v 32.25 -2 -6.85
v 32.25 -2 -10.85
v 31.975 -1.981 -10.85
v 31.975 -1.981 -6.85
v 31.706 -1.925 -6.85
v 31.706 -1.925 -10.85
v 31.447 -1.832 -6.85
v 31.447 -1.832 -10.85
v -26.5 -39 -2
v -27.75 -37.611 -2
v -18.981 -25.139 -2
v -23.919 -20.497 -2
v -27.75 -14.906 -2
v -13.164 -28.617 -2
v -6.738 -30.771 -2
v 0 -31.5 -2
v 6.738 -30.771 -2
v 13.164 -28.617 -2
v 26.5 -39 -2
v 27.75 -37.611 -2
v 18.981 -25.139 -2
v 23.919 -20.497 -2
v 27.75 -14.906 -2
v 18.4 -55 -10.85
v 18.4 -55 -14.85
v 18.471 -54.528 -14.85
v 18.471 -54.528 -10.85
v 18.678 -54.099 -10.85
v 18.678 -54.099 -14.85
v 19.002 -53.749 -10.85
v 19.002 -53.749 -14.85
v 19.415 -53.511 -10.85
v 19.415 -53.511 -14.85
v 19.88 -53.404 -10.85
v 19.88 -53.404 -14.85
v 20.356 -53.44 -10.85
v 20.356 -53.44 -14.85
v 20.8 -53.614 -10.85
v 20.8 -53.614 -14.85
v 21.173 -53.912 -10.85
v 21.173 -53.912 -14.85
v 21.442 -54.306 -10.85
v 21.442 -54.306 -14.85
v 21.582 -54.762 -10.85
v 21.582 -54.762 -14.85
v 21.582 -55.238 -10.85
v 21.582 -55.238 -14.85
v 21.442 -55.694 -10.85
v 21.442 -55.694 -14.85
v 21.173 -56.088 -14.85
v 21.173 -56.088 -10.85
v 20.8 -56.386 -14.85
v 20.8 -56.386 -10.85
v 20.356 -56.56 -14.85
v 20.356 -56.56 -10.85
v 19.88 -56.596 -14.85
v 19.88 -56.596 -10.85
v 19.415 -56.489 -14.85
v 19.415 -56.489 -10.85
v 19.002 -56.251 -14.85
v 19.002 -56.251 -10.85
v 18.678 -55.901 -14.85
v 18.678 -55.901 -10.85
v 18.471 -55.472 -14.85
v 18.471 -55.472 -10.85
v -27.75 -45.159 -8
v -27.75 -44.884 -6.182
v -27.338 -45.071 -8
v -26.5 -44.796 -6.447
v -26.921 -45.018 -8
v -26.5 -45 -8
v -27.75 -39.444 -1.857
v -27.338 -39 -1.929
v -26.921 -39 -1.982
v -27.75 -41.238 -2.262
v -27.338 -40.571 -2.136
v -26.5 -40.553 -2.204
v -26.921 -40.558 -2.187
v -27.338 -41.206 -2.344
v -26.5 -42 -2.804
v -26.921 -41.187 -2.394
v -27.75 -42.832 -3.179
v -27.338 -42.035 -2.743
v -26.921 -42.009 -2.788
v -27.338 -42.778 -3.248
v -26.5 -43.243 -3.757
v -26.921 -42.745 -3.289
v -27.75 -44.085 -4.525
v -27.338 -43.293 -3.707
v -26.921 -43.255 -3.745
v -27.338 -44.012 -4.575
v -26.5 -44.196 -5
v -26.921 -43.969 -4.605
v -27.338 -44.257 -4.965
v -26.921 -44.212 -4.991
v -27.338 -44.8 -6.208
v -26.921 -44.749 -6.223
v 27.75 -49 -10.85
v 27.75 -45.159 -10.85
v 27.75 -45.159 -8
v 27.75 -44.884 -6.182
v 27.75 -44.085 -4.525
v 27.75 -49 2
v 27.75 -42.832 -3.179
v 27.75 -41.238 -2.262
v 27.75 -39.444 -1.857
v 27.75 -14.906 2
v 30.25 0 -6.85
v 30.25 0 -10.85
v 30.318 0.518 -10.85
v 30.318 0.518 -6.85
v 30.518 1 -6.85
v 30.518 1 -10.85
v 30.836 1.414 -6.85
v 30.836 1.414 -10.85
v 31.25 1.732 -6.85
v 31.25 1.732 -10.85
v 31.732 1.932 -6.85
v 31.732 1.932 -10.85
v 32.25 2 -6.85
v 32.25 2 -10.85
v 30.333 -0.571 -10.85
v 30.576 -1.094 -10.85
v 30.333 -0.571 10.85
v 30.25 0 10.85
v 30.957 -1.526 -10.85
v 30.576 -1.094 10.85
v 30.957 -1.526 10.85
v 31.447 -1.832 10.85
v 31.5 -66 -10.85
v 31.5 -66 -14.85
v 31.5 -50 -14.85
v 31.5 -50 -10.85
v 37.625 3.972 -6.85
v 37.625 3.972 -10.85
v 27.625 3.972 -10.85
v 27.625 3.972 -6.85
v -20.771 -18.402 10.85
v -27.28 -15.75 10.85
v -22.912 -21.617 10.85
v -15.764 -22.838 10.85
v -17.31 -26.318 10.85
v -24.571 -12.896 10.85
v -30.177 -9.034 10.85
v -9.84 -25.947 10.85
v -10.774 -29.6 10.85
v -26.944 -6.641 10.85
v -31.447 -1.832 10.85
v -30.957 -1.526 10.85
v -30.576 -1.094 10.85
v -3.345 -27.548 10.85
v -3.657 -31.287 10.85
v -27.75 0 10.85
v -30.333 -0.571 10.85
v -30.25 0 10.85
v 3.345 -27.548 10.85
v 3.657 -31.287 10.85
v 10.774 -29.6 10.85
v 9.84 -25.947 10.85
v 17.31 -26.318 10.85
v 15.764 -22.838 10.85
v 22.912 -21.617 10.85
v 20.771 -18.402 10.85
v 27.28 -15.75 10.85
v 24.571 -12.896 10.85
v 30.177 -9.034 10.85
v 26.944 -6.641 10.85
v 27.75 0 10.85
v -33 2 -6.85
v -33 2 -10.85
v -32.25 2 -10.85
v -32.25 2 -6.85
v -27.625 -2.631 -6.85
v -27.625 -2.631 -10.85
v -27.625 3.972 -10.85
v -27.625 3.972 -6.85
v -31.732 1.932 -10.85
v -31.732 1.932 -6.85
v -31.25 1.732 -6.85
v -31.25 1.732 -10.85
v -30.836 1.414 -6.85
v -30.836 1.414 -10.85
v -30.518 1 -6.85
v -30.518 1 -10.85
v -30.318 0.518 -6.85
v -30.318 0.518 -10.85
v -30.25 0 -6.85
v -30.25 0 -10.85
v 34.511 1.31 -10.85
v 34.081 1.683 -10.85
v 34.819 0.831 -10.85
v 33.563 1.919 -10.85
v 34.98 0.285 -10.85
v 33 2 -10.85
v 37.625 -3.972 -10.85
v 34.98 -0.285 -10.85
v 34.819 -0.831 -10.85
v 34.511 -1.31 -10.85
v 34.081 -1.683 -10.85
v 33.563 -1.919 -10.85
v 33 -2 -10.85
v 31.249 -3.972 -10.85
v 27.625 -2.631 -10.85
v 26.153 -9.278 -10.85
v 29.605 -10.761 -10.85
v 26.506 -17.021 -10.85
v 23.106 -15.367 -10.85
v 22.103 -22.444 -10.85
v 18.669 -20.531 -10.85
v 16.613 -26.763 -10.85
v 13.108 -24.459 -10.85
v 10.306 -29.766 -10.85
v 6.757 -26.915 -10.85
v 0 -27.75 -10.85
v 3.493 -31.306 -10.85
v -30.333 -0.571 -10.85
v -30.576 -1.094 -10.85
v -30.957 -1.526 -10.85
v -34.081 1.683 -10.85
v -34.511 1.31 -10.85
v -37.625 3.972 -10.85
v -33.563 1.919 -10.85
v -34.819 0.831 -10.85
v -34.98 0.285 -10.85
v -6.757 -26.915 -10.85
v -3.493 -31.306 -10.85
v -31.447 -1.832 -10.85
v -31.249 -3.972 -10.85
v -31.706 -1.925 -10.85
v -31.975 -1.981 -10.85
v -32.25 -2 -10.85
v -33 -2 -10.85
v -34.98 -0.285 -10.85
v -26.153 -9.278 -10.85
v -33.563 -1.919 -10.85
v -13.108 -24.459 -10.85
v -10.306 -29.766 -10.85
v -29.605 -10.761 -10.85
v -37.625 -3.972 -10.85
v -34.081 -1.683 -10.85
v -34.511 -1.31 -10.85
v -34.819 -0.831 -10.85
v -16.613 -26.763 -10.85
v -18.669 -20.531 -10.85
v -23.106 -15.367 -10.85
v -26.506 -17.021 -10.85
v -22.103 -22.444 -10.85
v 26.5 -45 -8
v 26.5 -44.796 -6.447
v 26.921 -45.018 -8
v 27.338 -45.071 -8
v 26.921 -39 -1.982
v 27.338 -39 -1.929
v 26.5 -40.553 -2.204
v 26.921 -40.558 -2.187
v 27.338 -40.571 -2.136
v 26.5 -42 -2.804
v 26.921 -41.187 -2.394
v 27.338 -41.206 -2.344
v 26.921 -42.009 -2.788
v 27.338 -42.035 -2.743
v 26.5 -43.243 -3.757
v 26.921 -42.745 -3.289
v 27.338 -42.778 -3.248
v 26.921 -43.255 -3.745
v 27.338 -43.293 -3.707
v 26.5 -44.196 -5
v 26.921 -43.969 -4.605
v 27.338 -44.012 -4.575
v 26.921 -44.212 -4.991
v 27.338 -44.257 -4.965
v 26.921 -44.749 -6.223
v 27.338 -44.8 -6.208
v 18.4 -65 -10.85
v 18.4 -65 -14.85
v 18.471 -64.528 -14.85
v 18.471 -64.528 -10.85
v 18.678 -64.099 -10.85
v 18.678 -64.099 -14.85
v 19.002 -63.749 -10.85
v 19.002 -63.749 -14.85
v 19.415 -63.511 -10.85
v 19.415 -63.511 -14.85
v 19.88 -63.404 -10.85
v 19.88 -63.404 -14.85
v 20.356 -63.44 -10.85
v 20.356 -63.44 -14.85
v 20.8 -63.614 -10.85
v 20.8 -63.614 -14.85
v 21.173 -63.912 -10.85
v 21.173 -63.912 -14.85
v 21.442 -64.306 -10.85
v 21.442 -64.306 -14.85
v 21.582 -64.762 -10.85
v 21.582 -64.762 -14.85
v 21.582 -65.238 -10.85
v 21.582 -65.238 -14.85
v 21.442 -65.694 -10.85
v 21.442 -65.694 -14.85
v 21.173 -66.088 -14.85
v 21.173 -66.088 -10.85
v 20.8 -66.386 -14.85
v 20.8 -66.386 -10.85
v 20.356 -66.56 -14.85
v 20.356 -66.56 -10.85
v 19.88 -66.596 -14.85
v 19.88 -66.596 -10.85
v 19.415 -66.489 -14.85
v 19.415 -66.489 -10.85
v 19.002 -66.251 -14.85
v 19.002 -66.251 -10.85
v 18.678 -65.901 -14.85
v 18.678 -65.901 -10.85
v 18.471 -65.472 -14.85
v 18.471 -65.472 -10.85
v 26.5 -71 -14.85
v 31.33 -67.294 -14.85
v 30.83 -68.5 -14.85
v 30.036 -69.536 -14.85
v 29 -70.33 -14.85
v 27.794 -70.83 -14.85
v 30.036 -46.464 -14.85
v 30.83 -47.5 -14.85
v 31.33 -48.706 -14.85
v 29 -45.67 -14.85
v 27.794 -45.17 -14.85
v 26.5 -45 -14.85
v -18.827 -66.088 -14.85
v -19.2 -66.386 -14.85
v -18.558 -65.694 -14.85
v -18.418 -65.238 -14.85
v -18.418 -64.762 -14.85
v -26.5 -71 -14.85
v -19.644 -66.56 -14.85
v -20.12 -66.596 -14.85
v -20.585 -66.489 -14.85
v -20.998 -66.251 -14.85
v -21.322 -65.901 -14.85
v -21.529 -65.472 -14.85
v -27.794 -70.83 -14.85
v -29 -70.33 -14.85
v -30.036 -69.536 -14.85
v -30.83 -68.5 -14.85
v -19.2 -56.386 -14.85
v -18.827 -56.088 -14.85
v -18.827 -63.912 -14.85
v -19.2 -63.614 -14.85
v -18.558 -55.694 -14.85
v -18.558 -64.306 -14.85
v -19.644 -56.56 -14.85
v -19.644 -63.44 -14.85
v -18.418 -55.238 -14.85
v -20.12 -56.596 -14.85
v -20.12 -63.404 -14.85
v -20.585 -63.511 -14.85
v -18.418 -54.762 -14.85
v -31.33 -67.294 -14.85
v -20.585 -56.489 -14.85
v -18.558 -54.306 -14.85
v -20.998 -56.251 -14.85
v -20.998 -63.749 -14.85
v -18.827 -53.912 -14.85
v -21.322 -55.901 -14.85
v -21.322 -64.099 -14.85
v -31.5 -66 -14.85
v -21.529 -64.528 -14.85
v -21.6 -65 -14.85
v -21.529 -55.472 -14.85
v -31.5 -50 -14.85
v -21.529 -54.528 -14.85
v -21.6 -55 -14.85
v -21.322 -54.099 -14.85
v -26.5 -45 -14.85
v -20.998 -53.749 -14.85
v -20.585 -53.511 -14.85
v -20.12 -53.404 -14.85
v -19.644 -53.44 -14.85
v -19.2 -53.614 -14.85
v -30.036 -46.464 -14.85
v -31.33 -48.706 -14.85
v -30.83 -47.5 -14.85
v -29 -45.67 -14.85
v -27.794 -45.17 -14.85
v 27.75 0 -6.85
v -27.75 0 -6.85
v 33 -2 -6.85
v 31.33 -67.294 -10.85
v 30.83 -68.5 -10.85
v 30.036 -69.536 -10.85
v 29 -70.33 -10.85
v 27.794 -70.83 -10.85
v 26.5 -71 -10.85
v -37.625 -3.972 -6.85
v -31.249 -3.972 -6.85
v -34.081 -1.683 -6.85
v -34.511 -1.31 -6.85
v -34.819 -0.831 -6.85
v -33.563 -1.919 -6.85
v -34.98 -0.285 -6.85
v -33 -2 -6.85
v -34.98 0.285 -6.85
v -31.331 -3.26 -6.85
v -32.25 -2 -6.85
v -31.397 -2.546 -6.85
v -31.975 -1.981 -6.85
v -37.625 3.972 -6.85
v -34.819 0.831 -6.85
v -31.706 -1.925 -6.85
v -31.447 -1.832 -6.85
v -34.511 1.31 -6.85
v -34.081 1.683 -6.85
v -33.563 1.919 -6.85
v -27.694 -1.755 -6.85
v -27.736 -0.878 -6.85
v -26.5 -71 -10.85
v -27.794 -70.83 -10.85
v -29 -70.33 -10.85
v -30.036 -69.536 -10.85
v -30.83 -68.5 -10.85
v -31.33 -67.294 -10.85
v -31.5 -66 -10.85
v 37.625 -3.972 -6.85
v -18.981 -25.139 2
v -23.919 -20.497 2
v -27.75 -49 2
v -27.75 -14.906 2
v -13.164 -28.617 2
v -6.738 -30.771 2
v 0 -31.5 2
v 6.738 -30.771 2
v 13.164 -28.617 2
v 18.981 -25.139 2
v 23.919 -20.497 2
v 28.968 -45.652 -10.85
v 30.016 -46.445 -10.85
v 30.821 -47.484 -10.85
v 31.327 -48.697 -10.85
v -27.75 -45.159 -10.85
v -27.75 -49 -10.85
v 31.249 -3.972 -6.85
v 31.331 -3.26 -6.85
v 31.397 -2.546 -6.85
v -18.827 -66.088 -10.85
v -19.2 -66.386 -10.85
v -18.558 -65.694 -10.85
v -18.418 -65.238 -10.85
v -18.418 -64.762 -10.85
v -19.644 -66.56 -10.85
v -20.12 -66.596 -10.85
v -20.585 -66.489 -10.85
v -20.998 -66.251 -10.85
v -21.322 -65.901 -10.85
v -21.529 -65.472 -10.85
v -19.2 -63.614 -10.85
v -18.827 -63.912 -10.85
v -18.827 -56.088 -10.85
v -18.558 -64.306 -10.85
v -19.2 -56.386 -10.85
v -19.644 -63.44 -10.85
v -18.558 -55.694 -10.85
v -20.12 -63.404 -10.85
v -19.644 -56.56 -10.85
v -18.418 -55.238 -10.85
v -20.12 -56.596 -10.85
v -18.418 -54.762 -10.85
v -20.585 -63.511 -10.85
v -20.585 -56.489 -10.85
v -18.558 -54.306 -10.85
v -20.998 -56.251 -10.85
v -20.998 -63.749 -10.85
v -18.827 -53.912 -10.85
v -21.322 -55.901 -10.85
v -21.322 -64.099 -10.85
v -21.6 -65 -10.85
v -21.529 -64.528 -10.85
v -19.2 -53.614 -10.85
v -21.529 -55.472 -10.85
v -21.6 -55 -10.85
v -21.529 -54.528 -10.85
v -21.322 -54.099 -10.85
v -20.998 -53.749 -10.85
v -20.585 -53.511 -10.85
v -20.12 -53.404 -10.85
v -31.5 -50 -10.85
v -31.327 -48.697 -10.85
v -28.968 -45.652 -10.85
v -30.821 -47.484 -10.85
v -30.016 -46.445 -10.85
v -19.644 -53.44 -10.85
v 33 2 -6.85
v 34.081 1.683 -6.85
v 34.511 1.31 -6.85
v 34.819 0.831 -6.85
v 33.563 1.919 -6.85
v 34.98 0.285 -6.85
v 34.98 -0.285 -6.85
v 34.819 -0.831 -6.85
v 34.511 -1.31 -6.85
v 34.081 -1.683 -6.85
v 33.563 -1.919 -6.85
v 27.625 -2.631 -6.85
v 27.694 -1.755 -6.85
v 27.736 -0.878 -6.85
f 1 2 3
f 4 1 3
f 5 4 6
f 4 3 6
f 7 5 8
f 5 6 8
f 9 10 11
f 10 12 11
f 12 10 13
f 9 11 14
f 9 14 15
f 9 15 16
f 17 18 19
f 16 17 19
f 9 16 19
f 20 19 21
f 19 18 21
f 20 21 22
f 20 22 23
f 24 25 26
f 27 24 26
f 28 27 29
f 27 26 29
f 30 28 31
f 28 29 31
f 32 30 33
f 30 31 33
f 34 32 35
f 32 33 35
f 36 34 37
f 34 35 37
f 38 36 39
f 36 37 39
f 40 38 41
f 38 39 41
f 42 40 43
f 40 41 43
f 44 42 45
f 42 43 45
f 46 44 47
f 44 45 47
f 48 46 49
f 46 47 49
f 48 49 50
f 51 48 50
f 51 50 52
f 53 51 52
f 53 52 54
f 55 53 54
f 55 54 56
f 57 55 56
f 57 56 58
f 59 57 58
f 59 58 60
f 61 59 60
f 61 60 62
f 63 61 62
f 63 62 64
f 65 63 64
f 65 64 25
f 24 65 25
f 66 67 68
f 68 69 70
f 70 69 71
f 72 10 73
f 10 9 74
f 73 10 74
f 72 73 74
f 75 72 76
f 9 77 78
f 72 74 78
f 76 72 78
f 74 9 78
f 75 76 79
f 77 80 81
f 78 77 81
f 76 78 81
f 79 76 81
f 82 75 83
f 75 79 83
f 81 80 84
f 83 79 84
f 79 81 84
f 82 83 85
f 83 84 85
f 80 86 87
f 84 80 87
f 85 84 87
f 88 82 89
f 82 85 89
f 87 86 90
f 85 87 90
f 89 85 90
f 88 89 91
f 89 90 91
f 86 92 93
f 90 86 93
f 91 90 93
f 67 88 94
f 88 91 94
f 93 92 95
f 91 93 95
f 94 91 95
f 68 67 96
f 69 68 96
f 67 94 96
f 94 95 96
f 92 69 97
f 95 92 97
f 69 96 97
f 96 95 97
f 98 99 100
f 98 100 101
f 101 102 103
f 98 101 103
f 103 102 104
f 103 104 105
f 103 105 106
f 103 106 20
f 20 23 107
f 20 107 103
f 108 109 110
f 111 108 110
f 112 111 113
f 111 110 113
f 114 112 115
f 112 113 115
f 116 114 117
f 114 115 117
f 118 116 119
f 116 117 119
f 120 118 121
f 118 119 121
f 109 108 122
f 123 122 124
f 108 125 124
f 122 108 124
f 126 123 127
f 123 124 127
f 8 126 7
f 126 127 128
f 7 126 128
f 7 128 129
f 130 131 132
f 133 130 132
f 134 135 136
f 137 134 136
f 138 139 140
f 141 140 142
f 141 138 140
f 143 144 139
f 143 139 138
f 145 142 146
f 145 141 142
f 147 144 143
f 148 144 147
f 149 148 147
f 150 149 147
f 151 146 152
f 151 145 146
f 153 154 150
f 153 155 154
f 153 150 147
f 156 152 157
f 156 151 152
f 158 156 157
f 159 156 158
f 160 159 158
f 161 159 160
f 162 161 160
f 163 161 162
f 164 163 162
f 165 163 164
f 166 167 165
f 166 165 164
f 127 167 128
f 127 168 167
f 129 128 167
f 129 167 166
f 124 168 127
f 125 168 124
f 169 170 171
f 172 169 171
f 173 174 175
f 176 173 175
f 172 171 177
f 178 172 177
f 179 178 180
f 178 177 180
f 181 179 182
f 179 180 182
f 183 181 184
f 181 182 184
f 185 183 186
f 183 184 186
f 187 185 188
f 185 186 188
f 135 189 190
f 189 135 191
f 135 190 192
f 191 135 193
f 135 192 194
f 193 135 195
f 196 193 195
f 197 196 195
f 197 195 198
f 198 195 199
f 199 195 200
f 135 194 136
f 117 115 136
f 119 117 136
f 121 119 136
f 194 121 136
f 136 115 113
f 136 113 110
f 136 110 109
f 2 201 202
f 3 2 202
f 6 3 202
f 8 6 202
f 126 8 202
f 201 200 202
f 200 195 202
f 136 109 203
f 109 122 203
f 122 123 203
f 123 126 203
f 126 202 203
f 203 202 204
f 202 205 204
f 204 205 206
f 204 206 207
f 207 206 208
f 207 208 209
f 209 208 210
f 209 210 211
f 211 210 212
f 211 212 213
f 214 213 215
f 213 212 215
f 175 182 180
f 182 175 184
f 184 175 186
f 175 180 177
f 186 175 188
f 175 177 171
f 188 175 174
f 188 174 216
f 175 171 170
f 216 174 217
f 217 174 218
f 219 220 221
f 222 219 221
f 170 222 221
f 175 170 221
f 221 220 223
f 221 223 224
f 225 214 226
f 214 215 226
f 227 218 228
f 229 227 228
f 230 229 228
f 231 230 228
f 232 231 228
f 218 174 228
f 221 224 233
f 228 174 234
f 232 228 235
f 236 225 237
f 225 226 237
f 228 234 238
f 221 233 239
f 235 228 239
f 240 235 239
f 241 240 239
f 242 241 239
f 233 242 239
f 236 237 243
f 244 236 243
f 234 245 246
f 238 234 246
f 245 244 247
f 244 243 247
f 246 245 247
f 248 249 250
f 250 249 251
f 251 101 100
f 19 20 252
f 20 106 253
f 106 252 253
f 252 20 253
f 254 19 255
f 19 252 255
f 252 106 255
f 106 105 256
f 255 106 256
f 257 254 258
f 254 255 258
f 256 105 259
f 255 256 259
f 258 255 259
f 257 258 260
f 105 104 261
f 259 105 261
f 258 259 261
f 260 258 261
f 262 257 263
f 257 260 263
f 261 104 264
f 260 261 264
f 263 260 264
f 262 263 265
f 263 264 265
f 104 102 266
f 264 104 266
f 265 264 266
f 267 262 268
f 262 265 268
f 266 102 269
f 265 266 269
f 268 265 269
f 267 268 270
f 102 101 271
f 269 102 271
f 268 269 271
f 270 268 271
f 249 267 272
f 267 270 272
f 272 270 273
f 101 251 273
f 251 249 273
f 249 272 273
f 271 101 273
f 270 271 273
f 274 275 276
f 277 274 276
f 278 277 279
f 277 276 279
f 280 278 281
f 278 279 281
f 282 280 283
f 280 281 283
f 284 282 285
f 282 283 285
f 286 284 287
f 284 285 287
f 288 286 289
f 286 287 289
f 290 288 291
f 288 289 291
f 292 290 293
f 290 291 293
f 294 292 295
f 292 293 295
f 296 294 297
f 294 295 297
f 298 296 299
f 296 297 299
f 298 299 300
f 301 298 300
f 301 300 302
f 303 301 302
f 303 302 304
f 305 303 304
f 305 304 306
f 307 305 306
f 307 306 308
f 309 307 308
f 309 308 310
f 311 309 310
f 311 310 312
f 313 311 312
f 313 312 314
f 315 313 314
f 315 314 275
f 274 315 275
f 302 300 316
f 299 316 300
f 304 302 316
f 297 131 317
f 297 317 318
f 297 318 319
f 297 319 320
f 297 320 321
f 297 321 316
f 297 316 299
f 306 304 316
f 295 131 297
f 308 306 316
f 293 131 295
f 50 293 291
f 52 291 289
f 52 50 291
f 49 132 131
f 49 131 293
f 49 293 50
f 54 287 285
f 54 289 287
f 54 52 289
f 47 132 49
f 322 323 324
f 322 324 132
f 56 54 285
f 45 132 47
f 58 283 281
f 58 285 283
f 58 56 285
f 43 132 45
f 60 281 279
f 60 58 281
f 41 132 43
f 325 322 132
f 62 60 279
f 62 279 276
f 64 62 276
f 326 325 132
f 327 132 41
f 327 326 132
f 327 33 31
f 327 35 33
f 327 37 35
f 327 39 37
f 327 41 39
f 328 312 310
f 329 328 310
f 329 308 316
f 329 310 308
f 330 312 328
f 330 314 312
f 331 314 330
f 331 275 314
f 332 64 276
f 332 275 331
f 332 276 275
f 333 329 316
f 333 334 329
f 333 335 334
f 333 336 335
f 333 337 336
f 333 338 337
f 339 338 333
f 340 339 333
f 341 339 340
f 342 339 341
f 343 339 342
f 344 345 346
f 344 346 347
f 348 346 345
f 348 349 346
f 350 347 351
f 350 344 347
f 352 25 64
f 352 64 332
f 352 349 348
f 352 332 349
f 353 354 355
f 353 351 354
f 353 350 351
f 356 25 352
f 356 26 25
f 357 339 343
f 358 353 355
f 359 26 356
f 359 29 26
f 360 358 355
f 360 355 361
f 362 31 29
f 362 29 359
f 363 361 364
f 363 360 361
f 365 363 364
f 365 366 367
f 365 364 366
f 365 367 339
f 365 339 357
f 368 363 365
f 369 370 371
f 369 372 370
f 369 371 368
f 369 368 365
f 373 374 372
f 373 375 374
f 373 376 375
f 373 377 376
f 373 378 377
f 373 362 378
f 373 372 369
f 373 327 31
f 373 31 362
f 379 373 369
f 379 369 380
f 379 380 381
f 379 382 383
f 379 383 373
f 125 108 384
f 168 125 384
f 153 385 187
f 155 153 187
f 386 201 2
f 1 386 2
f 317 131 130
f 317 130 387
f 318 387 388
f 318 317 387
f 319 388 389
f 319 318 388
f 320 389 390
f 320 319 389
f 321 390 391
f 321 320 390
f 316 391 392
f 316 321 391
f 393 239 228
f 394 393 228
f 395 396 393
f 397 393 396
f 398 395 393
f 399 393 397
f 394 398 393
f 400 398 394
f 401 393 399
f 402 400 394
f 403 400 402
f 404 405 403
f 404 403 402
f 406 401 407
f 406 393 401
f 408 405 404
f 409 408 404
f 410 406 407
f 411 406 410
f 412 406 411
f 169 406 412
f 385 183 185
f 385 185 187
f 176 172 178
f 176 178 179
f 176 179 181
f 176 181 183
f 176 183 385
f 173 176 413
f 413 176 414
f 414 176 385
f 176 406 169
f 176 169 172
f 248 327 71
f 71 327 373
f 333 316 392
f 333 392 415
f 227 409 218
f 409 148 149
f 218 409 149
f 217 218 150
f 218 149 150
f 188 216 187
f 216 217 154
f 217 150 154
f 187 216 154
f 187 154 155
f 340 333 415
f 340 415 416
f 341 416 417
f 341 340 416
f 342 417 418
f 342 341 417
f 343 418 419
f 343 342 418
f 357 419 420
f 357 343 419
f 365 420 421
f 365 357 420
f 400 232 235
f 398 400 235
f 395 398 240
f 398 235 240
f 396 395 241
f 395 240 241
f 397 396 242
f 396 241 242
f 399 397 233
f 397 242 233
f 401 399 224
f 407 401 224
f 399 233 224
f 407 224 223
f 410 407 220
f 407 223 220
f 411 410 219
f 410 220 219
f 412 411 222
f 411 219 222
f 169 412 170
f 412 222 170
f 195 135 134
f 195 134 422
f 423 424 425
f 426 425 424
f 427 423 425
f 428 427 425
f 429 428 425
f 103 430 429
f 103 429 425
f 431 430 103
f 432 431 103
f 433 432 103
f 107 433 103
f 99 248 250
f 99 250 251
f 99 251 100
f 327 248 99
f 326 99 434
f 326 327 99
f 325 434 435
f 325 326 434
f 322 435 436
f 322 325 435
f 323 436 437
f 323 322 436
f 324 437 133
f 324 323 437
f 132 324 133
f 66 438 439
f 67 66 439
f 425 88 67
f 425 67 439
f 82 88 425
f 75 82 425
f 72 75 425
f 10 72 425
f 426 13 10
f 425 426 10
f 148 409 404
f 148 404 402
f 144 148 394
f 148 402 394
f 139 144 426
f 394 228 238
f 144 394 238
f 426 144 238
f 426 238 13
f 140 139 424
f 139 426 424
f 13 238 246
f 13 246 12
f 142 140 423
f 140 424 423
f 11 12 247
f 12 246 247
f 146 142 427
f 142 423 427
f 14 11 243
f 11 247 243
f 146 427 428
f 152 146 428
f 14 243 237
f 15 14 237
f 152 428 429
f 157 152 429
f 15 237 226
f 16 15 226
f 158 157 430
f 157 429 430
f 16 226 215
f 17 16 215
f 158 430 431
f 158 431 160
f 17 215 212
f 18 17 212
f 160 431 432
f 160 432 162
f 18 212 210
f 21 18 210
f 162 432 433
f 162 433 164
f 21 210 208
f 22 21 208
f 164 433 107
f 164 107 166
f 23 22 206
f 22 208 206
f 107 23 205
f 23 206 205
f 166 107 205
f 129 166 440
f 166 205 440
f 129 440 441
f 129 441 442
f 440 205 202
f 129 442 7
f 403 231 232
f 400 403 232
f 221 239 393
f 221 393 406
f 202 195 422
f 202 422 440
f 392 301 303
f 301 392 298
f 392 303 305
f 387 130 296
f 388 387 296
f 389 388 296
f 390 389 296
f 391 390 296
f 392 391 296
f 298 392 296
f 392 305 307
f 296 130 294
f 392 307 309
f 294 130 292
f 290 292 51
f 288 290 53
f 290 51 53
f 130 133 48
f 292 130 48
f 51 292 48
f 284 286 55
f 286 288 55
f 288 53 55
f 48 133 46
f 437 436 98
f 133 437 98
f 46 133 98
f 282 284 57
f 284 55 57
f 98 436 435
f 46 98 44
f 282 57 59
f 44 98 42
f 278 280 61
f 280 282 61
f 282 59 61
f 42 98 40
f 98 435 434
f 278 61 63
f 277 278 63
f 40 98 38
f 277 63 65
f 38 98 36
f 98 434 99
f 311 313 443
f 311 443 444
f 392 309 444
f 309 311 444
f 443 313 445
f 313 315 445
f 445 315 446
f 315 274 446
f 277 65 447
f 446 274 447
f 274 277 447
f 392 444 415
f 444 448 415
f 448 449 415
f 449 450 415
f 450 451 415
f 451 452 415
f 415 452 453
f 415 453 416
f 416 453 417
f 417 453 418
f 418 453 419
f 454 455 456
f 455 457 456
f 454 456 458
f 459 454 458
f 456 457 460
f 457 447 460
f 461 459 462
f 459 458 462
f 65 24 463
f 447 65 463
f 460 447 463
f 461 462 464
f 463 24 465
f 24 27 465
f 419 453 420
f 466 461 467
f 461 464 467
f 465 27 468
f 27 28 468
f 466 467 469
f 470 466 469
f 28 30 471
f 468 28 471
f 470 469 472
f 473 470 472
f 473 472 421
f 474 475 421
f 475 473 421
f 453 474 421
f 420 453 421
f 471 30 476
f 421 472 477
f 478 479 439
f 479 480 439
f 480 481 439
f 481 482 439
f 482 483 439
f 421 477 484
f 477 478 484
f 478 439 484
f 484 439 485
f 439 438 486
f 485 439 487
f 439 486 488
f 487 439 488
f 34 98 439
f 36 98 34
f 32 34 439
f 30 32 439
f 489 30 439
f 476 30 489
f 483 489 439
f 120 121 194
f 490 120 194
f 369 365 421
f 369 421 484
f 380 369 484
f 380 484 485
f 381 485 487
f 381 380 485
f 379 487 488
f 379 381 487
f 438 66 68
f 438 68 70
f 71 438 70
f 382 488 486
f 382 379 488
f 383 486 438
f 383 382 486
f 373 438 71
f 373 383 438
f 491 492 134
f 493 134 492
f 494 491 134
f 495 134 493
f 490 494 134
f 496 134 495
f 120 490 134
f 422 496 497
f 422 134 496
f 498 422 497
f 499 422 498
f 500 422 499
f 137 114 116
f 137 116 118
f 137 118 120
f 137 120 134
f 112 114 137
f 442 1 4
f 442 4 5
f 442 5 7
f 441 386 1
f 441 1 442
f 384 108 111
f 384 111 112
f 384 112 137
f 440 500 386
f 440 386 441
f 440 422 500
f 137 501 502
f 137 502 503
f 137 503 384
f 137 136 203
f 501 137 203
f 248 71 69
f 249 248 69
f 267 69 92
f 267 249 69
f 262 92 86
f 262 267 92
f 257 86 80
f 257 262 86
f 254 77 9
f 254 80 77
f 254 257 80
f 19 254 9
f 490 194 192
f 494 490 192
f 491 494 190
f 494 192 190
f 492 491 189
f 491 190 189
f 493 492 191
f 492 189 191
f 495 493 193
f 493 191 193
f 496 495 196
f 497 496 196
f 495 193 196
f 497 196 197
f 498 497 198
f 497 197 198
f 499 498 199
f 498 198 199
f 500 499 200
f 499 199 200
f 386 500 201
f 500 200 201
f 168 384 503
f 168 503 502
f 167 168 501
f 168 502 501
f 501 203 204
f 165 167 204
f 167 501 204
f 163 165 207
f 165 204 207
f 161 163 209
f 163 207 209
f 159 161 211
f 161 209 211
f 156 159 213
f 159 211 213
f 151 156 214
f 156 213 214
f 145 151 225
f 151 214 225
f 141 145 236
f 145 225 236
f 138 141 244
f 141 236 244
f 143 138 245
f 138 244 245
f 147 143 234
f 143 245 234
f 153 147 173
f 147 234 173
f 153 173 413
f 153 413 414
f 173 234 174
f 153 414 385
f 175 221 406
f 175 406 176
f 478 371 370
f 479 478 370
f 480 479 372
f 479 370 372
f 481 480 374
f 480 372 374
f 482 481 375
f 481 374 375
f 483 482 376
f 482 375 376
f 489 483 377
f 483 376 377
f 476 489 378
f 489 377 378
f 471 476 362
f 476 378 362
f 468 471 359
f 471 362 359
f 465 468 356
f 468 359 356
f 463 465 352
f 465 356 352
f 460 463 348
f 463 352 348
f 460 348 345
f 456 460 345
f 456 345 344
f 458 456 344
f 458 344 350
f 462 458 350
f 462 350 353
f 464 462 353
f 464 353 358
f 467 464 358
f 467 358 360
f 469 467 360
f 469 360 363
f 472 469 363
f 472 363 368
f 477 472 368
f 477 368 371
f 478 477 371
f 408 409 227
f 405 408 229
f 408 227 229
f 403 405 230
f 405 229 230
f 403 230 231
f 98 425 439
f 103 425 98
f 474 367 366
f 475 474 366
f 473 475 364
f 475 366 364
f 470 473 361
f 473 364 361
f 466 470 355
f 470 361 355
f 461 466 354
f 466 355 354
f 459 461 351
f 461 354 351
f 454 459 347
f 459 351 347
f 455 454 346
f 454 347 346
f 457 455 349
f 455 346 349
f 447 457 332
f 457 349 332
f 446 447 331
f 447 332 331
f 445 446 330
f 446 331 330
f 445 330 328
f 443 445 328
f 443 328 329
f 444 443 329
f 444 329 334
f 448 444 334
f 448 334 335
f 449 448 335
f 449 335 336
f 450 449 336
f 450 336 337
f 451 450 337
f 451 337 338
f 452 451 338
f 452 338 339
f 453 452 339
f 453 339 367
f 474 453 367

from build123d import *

# Parameters (mm, degrees)
BOSS_EXTRU_1_DEPTH           = 10.85
BOSS_EXTRU_1_DEPTH_BACK      = 10.85
BOSS_EXTRU_2_START           = -10.85
ESQUISSE2_W                  = 10
ESQUISSE2_H                  = 7.943097622
BOSS_EXTRU_2_DEPTH           = 4
ESQUISSE3_R                  = 2
ENL_V_MAT_EXTRU_1_DEPTH      = 51.255478557
R_P_TITION_CIRCULAIRE1_COUNT = 2
BOSS_EXTRU_3_DEPTH           = 2
BOSS_EXTRU_3_DEPTH_BACK      = 2
ESQUISSE5_W                  = 55.5
ESQUISSE5_H                  = 16.85
BOSS_EXTRU_4_DEPTH           = 4
CONG_1_R                     = 6
ESQUISSE6_W                  = 63
ESQUISSE6_H                  = 26
BOSS_EXTRU_5_DEPTH           = 4
ESQUISSE7_R                  = 1.6
ENL_V_MAT_EXTRU_2_DEPTH      = 10
CONG_2_START                 = -16
CONG_2_DEPTH                 = 7.9999999


with BuildPart() as part:
    # Esquisse1 → Boss.-Extru.1 (new, two sides: drawn at the far end of the back side and taken through both)
    with BuildSketch(Plane.XY.offset(-BOSS_EXTRU_1_DEPTH_BACK)):
        with BuildLine():
            Line((31.5, 0), (27.75, 0))
            ThreePointArc((27.75, 0), (0, -27.75), (-27.75, 0))
            Line((-27.75, 0), (-31.5, 0))
            ThreePointArc((-31.5, 0), (0, -31.5), (31.5, 0))
        make_face()
    extrude(amount=BOSS_EXTRU_1_DEPTH + BOSS_EXTRU_1_DEPTH_BACK)

    # Esquisse2 → Boss.-Extru.2 (add)
    with BuildSketch(Plane.XY.offset(BOSS_EXTRU_2_START)):
        with Locations((-32.625, 0)):
            Rectangle(ESQUISSE2_W, ESQUISSE2_H)
        with BuildLine():
            ThreePointArc((-33, -2), (-35, 0), (-33, 2))
            Line((-33, 2), (-32.25, 2))
            ThreePointArc((-32.25, 2), (-30.835786438, 1.414213562), (-30.25, 0))
            ThreePointArc((-30.25, 0), (-30.835786438, -1.414213562), (-32.25, -2))
            Line((-32.25, -2), (-33, -2))
        make_face(mode=Mode.SUBTRACT)
    boss_extru_2 = extrude(amount=BOSS_EXTRU_2_DEPTH)

    # Esquisse3 → Enlèv. mat.-Extru.1 (cut, symmetric)
    with BuildSketch(Plane.XY):
        with Locations((-32.25, 0)):
            Circle(ESQUISSE3_R)
    enl_v_mat_extru_1 = extrude(amount=ENL_V_MAT_EXTRU_1_DEPTH, both=True, mode=Mode.SUBTRACT)

    # Répétition circulaire1: Boss.-Extru.2, Enlèv. mat.-Extru.1 ×2 about axis
    r_p_tition_circulaire1_axis = Axis((0, 0, 0), (0, 0, 1))
    add([boss_extru_2.rotate(r_p_tition_circulaire1_axis, i * 360 / R_P_TITION_CIRCULAIRE1_COUNT) for i in range(1, R_P_TITION_CIRCULAIRE1_COUNT)])
    add([enl_v_mat_extru_1.rotate(r_p_tition_circulaire1_axis, i * 360 / R_P_TITION_CIRCULAIRE1_COUNT) for i in range(1, R_P_TITION_CIRCULAIRE1_COUNT)], mode=Mode.SUBTRACT)

    # Esquisse4 → Boss.-Extru.3 (add, two sides: drawn at the far end of the back side and taken through both)
    with BuildSketch(Plane.XY.offset(-BOSS_EXTRU_3_DEPTH_BACK)):
        with BuildLine():
            Line((27.75, -45), (27.75, -3.971548811))
            Line((27.75, -3.971548811), (27.464327773, -3.971548811))
            ThreePointArc((27.464327773, -3.971548811), (0, -27.75), (-27.464327773, -3.971548811))
            Line((-27.464327773, -3.971548811), (-27.75, -3.971548811))
            Line((-27.75, -3.971548811), (-27.75, -45))
            Line((-27.75, -45), (27.75, -45))
        make_face()
    extrude(amount=BOSS_EXTRU_3_DEPTH + BOSS_EXTRU_3_DEPTH_BACK)

    # Esquisse5 → Boss.-Extru.4 (add)
    with BuildSketch(Plane.XZ.offset(45)):
        with Locations((0, -6.425)):
            Rectangle(ESQUISSE5_W, ESQUISSE5_H)
    extrude(amount=BOSS_EXTRU_4_DEPTH)

    # Congé1
    cong_1_edges = [part.edges().sort_by_distance(p)[0] for p in [
        (0, -45, -2),
    ]]
    fillet(cong_1_edges, radius=CONG_1_R)

    # Esquisse6 → Boss.-Extru.5 (add)
    with BuildSketch(Plane(origin=(0, 0, -14.85), x_dir=(-1, 0, 0), z_dir=(0, 0, -1))):
        with Locations((0, -58)):
            Rectangle(ESQUISSE6_W, ESQUISSE6_H)
    extrude(amount=-BOSS_EXTRU_5_DEPTH)

    # Esquisse7 → Enlèv. mat.-Extru.2 (cut)
    with BuildSketch(Plane(origin=(0, 0, -14.85), x_dir=(-1, 0, 0), z_dir=(0, 0, -1))):
        with Locations((-20, -55)):
            Circle(ESQUISSE7_R)
        with Locations((20, -55)):
            Circle(ESQUISSE7_R)
        with Locations((-20, -65)):
            Circle(ESQUISSE7_R)
        with Locations((20, -65)):
            Circle(ESQUISSE7_R)
    extrude(amount=-ENL_V_MAT_EXTRU_2_DEPTH, mode=Mode.SUBTRACT)

    # Congé2: read off the stored shape, not the designer's step
    # Congé2 outline → Congé2 (cut)
    with BuildSketch(Plane.XY.offset(CONG_2_START)):
        with BuildLine():
            Line((-31.5, -71), (-26.5, -71))
            ThreePointArc((-26.5, -71), (-30.035533906, -69.535533906), (-31.5, -66))
            Line((-31.5, -66), (-31.5, -71))
        make_face()
        with BuildLine():
            ThreePointArc((31.5, -66), (30.035533906, -69.535533906), (26.5, -71))
            Line((26.5, -71), (31.5, -71))
            Line((31.5, -71), (31.5, -66))
        make_face()
        with BuildLine():
            Line((-31.5, -45), (-31.5, -50))
            ThreePointArc((-31.5, -50), (-30.035533906, -46.464466094), (-26.5, -45))
            Line((-26.5, -45), (-31.5, -45))
        make_face()
        with BuildLine():
            Line((31.5, -50), (31.5, -45))
            Line((31.5, -45), (26.5, -45))
            ThreePointArc((26.5, -45), (30.035533906, -46.464466094), (31.5, -50))
        make_face()
    extrude(amount=CONG_2_DEPTH, mode=Mode.SUBTRACT)

    # Cong_2 2 outline → Cong_2 2 (revolve, cut)
    with BuildSketch(Plane(origin=(0, -39, -8), x_dir=(0, 1, 0), z_dir=(0, 0, -1))):
        with BuildLine():
            Line((6, -27.75), (6.158770817, -27.75))
            ThreePointArc((6.158770817, -27.75), (6.039851519, -27.130021462), (6, -26.5))
            Line((6, -26.5), (6, -27.75))
        make_face()
        with BuildLine():
            Line((6, 27.75), (6, 26.5))
            ThreePointArc((6, 26.5), (6.039851519, 27.130021462), (6.158770817, 27.75))
            Line((6.158770817, 27.75), (6, 27.75))
        make_face()
    revolve(axis=Axis((0, -39, -8), (1, 0, 0)), mode=Mode.SUBTRACT)


solid = part.part
